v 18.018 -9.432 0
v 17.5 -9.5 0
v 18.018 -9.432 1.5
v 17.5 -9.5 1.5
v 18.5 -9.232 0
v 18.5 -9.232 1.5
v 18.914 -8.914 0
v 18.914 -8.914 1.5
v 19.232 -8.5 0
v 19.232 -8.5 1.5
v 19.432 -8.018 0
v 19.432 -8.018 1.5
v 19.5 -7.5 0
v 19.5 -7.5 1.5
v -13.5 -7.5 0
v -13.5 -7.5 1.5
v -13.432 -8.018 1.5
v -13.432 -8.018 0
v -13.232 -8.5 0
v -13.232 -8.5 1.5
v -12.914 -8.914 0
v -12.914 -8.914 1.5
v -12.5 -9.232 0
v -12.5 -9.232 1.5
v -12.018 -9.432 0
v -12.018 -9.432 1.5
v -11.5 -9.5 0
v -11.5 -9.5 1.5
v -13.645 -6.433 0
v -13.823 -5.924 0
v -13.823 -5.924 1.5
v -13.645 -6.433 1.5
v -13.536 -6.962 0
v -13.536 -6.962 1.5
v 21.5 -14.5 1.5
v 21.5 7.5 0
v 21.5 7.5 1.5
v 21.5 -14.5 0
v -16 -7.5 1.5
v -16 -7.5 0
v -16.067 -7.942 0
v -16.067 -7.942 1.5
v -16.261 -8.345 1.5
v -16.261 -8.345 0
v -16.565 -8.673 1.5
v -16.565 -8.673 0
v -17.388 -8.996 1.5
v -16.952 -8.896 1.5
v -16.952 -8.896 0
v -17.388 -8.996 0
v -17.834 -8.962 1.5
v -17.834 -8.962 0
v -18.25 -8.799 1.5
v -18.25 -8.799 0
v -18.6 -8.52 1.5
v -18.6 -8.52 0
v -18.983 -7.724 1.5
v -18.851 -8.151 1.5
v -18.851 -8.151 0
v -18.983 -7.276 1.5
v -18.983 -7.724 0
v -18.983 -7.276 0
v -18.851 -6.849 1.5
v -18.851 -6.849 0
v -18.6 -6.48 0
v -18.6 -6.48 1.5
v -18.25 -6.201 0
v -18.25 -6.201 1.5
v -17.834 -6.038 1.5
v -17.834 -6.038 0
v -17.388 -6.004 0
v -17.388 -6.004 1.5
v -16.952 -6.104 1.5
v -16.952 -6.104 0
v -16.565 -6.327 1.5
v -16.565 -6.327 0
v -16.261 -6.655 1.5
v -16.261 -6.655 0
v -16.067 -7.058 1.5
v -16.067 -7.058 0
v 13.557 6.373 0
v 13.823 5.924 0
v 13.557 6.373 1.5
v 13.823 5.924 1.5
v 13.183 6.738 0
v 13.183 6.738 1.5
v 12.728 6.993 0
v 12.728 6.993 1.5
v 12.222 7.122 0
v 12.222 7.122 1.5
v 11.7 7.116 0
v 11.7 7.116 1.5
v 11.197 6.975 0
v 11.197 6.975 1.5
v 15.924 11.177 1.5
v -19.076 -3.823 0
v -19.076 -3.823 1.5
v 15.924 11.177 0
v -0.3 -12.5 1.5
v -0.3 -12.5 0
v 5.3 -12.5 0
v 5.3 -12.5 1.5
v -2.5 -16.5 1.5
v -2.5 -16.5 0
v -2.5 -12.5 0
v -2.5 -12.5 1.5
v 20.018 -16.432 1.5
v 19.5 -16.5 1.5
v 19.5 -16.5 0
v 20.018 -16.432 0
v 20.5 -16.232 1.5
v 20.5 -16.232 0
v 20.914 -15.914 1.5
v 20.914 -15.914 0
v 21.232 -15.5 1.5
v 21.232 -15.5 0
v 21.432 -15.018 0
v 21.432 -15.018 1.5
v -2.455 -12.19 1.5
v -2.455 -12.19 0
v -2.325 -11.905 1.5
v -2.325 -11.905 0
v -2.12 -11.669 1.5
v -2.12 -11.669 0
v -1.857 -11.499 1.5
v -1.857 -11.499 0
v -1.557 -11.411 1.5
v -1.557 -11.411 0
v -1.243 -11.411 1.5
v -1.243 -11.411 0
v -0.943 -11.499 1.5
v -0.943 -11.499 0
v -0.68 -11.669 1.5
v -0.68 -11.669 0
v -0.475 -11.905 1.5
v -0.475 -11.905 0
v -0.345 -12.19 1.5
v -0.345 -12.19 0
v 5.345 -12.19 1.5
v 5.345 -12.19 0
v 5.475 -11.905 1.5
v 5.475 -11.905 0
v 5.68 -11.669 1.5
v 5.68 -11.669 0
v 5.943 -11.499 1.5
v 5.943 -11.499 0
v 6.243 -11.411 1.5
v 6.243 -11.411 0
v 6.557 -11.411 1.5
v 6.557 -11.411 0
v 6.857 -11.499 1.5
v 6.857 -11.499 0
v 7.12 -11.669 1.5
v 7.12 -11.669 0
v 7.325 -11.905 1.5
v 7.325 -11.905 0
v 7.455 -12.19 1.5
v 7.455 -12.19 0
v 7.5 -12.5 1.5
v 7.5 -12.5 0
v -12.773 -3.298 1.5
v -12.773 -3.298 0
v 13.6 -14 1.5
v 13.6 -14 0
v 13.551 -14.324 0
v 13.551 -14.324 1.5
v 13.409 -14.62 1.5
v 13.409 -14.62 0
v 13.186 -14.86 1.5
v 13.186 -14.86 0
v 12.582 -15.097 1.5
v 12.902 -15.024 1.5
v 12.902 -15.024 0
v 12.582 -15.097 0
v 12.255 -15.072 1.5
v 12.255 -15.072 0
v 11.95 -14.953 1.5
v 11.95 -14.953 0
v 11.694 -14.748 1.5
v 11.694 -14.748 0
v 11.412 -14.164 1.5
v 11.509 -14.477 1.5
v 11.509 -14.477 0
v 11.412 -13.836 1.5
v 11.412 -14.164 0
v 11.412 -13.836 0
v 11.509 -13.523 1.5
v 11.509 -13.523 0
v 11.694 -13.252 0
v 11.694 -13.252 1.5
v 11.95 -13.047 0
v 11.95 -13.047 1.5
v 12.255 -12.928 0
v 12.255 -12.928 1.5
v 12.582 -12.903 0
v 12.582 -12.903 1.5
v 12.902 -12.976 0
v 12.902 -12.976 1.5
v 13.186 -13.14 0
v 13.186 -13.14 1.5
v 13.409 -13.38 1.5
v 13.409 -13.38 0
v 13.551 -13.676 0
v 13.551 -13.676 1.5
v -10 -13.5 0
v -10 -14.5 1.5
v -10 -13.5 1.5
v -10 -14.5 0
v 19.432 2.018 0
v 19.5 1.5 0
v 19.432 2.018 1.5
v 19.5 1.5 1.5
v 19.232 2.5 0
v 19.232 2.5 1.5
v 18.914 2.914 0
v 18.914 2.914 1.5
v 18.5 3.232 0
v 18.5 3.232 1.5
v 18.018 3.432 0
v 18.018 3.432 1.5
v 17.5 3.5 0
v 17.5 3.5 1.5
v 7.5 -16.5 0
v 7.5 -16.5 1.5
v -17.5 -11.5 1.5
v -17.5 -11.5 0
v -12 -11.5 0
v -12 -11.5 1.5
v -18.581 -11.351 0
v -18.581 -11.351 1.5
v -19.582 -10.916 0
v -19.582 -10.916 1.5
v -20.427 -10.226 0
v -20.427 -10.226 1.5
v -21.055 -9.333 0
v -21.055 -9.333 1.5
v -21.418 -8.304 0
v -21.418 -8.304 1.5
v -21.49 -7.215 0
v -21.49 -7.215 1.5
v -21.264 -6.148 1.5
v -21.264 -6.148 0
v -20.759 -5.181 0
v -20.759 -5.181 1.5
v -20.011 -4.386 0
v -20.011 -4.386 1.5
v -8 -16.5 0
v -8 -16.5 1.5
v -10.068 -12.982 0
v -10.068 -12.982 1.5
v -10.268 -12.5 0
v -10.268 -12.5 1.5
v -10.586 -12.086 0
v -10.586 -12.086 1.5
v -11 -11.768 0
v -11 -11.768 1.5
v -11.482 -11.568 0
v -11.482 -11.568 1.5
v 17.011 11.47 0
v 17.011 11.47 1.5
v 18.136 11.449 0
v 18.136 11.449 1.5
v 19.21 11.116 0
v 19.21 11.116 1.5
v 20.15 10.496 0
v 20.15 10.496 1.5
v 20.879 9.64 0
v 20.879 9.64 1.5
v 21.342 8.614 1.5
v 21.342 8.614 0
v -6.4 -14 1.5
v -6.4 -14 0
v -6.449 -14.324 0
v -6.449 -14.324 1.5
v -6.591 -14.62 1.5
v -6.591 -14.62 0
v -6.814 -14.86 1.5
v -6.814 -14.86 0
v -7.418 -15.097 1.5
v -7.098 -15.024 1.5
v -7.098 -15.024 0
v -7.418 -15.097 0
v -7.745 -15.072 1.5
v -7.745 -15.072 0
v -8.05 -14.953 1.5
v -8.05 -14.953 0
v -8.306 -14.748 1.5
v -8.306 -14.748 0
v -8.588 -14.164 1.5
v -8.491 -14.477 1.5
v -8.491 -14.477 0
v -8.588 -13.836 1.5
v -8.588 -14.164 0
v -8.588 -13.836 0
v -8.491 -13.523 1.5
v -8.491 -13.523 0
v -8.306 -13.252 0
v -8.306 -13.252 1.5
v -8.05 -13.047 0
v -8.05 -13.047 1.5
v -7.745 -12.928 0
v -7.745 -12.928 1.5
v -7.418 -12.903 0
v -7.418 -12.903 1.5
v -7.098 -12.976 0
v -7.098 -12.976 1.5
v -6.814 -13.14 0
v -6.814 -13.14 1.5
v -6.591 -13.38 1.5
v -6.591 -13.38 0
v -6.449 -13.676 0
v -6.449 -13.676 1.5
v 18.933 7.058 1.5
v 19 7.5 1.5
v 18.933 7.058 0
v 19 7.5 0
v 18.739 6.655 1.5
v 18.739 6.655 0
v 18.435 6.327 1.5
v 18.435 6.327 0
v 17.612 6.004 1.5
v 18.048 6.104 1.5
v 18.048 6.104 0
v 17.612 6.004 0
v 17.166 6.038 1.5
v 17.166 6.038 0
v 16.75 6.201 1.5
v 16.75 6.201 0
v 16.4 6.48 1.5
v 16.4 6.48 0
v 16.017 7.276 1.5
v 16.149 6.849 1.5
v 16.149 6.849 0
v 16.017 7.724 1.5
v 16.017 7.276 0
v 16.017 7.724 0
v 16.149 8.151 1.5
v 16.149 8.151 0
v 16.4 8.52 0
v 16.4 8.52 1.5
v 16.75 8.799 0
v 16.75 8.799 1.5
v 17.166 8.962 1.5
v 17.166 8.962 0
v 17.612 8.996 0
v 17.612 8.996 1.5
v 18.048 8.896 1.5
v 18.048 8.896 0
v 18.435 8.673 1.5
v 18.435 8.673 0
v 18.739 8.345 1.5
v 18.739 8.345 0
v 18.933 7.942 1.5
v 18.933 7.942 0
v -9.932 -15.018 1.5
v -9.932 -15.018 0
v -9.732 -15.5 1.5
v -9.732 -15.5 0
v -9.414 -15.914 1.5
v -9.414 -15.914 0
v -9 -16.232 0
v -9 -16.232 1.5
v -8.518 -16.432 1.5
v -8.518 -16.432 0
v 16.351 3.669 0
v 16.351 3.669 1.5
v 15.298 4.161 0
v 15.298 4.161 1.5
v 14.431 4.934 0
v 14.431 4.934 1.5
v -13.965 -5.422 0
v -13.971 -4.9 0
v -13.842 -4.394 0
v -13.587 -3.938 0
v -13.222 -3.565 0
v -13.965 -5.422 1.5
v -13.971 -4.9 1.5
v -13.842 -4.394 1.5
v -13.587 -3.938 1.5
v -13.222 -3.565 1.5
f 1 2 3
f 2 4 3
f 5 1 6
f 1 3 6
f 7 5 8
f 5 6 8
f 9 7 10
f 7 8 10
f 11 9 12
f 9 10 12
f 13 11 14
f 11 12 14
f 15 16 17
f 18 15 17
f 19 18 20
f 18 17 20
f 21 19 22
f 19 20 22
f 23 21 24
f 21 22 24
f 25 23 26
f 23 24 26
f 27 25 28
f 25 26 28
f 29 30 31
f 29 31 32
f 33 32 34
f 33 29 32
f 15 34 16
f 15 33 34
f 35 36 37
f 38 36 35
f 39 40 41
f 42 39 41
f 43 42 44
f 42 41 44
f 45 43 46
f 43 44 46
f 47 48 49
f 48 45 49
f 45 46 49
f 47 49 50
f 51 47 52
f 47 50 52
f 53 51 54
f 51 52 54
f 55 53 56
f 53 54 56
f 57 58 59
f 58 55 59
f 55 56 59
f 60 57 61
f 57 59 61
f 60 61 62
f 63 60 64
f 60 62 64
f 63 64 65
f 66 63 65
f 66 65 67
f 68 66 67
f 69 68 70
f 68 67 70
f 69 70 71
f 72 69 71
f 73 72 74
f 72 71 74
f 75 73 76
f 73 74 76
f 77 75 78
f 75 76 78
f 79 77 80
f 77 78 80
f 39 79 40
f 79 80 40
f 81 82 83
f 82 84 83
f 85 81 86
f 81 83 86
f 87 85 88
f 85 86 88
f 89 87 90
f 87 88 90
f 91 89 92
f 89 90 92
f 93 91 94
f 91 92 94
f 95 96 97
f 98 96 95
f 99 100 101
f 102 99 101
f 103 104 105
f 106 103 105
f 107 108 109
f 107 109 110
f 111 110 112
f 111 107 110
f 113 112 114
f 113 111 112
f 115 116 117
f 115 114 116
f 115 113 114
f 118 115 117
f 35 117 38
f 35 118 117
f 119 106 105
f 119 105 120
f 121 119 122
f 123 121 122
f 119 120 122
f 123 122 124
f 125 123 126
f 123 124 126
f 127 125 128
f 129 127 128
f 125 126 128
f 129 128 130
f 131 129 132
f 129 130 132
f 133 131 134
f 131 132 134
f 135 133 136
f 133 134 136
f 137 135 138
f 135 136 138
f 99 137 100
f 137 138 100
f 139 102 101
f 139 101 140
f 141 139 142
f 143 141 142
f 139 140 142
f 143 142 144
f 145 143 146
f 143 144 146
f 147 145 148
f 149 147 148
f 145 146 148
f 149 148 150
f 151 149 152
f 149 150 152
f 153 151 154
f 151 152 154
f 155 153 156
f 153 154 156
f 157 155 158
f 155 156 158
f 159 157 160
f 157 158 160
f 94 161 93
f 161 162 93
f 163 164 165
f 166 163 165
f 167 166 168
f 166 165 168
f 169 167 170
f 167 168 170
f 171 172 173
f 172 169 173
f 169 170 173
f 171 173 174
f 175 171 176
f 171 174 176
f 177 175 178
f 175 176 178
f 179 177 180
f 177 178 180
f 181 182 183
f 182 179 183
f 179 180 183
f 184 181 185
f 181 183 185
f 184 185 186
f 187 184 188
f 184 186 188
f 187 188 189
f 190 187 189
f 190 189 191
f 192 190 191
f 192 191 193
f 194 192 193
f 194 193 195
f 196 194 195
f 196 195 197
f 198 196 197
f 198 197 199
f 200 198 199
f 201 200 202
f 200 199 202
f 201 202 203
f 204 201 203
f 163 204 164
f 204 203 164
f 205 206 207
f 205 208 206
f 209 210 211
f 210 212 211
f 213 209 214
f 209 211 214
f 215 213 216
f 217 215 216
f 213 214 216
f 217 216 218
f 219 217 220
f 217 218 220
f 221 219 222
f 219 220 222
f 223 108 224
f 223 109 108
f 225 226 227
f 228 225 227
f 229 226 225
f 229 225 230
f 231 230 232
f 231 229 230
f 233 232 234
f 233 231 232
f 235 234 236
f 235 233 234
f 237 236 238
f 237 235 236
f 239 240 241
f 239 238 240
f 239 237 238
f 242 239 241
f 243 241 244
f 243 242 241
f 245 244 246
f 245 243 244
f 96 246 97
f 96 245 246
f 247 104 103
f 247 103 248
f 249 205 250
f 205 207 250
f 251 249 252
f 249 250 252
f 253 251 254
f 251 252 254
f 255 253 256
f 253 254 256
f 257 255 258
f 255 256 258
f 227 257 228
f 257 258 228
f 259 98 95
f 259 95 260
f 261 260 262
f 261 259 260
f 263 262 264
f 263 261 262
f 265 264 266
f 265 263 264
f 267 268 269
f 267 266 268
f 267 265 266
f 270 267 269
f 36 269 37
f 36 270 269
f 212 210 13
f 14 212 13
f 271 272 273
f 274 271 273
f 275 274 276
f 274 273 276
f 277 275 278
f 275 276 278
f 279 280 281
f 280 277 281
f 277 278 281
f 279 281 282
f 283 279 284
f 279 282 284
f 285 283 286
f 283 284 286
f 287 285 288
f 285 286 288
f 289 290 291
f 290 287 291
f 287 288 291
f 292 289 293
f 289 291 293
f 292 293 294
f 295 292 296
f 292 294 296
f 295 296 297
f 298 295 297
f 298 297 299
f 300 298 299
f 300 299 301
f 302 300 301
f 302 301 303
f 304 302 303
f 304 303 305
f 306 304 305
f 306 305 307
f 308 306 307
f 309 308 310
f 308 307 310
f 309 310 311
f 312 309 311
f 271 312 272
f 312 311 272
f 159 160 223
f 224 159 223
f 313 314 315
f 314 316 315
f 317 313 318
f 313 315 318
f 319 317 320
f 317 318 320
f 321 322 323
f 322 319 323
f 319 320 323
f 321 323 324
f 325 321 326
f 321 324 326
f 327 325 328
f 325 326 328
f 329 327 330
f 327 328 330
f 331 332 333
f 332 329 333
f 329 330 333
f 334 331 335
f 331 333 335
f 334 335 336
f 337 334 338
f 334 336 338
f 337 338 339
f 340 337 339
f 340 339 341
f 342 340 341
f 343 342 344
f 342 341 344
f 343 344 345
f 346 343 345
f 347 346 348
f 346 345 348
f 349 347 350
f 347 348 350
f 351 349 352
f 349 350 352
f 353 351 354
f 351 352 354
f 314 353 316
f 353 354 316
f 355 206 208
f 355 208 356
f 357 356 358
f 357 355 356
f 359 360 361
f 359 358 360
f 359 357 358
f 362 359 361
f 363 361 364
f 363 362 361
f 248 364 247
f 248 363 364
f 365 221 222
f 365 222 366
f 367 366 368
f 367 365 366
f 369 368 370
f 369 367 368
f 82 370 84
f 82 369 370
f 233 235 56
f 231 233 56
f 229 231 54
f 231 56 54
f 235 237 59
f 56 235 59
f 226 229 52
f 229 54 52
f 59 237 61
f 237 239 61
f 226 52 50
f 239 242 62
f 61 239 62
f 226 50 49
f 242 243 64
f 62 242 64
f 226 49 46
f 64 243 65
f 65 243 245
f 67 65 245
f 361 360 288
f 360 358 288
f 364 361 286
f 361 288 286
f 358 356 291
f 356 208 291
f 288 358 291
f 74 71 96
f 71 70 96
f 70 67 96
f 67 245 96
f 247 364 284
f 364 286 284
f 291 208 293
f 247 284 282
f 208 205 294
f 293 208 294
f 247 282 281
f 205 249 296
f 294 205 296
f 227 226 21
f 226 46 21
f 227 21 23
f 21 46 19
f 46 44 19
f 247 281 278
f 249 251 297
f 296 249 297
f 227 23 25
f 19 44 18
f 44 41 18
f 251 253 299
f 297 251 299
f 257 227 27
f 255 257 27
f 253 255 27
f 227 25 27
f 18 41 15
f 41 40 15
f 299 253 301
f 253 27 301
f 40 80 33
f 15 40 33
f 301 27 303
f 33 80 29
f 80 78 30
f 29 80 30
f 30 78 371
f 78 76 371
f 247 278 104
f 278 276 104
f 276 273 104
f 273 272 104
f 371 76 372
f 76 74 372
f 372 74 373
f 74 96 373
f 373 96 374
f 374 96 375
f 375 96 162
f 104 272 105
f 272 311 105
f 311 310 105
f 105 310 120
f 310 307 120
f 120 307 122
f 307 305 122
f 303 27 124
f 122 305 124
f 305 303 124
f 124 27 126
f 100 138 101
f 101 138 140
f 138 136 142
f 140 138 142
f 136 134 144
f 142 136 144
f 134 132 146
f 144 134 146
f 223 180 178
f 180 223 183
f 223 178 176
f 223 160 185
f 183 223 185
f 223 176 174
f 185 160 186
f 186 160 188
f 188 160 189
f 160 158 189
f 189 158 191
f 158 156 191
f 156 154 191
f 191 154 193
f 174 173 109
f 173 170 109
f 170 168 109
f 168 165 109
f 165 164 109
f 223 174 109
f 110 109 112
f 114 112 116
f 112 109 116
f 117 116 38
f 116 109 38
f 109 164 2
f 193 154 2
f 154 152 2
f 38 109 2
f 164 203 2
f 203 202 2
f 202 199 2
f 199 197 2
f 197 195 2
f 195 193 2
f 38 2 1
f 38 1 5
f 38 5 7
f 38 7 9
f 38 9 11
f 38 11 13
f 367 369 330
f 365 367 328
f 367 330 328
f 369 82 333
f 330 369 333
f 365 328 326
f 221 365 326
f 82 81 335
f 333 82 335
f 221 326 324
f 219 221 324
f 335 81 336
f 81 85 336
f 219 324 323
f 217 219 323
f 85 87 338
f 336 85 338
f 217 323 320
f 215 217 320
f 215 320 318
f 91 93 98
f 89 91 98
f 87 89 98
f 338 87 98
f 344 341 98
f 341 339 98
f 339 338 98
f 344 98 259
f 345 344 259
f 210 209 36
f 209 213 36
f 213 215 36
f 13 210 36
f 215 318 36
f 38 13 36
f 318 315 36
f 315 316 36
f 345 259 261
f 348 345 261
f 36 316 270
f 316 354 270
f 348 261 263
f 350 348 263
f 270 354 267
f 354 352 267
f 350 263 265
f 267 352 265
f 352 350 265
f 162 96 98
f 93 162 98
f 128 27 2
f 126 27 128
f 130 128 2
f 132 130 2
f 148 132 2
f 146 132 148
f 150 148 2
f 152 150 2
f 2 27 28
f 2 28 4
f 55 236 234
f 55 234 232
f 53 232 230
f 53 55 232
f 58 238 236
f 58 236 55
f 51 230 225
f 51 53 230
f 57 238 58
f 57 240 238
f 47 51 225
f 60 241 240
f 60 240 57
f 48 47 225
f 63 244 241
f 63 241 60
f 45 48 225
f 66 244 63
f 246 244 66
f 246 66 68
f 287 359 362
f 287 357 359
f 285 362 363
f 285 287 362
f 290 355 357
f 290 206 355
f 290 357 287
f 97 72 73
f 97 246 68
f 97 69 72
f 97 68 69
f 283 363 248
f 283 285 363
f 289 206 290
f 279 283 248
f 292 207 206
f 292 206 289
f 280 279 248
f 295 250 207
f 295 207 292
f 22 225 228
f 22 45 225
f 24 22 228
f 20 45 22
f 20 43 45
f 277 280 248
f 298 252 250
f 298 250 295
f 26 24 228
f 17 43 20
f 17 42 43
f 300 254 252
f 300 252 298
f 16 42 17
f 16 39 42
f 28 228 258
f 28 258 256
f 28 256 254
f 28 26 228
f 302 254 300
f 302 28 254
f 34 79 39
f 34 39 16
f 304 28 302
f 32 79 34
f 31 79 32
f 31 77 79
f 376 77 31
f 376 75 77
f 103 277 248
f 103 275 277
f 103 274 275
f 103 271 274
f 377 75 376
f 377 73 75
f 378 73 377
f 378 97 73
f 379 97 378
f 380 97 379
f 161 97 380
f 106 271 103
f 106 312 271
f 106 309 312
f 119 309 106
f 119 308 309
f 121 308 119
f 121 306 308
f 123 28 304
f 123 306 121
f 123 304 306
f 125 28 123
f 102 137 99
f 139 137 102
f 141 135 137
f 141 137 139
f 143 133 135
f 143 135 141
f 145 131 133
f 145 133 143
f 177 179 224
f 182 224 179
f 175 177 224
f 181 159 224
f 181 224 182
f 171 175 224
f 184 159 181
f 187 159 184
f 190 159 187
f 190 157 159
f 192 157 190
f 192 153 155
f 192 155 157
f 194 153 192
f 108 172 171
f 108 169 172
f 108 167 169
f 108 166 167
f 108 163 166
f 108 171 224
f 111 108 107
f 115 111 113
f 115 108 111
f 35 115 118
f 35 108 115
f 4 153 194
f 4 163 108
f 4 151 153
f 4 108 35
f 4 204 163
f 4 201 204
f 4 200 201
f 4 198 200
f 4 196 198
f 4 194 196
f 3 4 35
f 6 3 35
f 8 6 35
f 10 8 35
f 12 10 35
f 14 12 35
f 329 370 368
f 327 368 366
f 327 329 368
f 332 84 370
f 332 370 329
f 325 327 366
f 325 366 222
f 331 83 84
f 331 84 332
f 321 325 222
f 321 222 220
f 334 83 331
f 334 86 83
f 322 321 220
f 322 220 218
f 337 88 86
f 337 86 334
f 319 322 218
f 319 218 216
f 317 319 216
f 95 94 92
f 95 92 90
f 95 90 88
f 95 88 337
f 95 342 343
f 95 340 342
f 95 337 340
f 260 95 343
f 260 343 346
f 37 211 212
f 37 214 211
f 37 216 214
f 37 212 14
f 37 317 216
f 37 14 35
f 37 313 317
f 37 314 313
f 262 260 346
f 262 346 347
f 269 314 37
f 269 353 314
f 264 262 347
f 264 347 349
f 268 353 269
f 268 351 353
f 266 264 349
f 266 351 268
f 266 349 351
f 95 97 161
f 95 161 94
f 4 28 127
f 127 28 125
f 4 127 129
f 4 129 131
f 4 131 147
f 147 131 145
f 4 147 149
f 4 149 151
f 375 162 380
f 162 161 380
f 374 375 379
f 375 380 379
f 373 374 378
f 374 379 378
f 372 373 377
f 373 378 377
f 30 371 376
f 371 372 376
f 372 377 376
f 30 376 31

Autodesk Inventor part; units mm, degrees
ref_plane "YZ Plane" through (0, 0, 0) normal (1, 0, 0) x (0, 1, 0)
ref_plane "XZ Plane" through (0, 0, 0) normal (0, 1, 0) x (-1, 0, 0)
ref_plane "XY Plane" through (0, 0, 0) normal (0, 0, 1) x (1, 0, 0)
sketch "スケッチ1" plane through (0, 0, 0) normal (0, 0, 1) x (1, 0, 0)
  circle A0 centre (-17.5, -7.5) radius 1.5
  circle A1 centre (17.5, 7.5) radius 1.5
  circle A2 centre (-17.5, -7.5) radius 4
  circle A3 centre (17.5, 7.5) radius 4
  line L0 (-2.5, -12.5) -> (7.5, -12.5)
  line L1 (7.5, -12.5) -> (7.5, -15.5)
  line L2 (7.5, -15.5) -> (-2.5, -15.5)
  line L3 (-2.5, -15.5) -> (-2.5, -12.5)
  circle A4 centre (-1.4, -12.5) radius 1.1
  line L4 (-2.5, -14) -> (7.5, -14) construction
  line L5 (2.5, -14) -> (2.5, -12.5) construction
  circle A5 centre (-1.4, -15.5) radius 1.1
  circle A6 centre (6.4, -12.5) radius 1.1
  circle A7 centre (6.4, -15.5) radius 1.1
  circle A8 centre (-7.5, -14) radius 1.1
  circle A9 centre (12.5, -14) radius 1.1
  line L6 (-19.0757, -3.8234) -> (15.9243, 11.1766)
  line L7 (21.5, 7.5) -> (21.5, -11.5)
  line L8 (-10, -11.5) -> (21.5, -11.5)
  line L9 (21.5, -11.5) -> (21.5, -16.5)
  line L10 (21.5, -16.5) -> (-10, -16.5)
  line L11 (-10, -16.5) -> (-10, -11.5)
  line L12 (-2.5, -15.5) -> (-2.5, -16.5)
  line L13 (7.5, -15.5) -> (7.5, -16.5)
  line L14 (-17.5, -11.5) -> (-10, -11.5)
  line L15 (21.5, -11.5) -> (21.5, -11.5)
  line L16 (-14.0359, -9.5) -> (19.5, -9.5)
  line L17 (19.5, 4.0359) -> (19.5, -9.5)
  line L18 (-15.1038, -4.2971) -> (13.5281, 7.9737)
  point P0 (0, 0)
  point P1 (-0.3, -12.5)
  point P2 (5.3, -12.5)
  point P3 (7.5, -12.5)
  dimension "d12" = 2.2
  dimension "d0" = 3
  dimension "d1" = 3
  dimension "d2" = 35
  dimension "d5" = 7.5
  dimension "d6" = 15
  dimension "d7" = 17.5
  dimension "d8" = 8
  dimension "d9" = 8
  dimension "d10" = 10
  dimension "d11" = 3
  dimension "d13" = 2.2
  dimension "d14" = 5
  dimension "d15" = 20
  dimension "d19" = 2.5
  dimension "d21" = 1
  dimension "d22" = 2
  dimension "d23" = 2
  dimension "d24" = 2
  dimension "d29" = 5
extrude "押し出し1" add sketch "スケッチ1" along normal blind 1.5 contours A2 | A2 L6 A3 L18 | L16 L17 A3 L7 L8 A6 A4 L14 A2 | A3 | L8 A4 L3 L12 L10 L11 | L9 L10 L13 L1 A6 L8 | L8 A6 L0 A4
fillet "フィレット1" radius 2 8 edges at (-10, -16.5, 0.75) (-10, -11.5, 0.75) (19.5, -9.5, 0.75) (21.5, -16.5, 0.75) (19.5, 4.0359, 0.75) (13.5281, 7.9737, 0.75) (-14.0359, -9.5, 0.75) (-15.1038, -4.2971, 0.75)
equation "\"d7\" = 0.5 * d2"
equation "\"d8\" = d9"
equation "\"d22\" = d24"
equation "\"d24\" = d23"
properties part number "シン・足首"
